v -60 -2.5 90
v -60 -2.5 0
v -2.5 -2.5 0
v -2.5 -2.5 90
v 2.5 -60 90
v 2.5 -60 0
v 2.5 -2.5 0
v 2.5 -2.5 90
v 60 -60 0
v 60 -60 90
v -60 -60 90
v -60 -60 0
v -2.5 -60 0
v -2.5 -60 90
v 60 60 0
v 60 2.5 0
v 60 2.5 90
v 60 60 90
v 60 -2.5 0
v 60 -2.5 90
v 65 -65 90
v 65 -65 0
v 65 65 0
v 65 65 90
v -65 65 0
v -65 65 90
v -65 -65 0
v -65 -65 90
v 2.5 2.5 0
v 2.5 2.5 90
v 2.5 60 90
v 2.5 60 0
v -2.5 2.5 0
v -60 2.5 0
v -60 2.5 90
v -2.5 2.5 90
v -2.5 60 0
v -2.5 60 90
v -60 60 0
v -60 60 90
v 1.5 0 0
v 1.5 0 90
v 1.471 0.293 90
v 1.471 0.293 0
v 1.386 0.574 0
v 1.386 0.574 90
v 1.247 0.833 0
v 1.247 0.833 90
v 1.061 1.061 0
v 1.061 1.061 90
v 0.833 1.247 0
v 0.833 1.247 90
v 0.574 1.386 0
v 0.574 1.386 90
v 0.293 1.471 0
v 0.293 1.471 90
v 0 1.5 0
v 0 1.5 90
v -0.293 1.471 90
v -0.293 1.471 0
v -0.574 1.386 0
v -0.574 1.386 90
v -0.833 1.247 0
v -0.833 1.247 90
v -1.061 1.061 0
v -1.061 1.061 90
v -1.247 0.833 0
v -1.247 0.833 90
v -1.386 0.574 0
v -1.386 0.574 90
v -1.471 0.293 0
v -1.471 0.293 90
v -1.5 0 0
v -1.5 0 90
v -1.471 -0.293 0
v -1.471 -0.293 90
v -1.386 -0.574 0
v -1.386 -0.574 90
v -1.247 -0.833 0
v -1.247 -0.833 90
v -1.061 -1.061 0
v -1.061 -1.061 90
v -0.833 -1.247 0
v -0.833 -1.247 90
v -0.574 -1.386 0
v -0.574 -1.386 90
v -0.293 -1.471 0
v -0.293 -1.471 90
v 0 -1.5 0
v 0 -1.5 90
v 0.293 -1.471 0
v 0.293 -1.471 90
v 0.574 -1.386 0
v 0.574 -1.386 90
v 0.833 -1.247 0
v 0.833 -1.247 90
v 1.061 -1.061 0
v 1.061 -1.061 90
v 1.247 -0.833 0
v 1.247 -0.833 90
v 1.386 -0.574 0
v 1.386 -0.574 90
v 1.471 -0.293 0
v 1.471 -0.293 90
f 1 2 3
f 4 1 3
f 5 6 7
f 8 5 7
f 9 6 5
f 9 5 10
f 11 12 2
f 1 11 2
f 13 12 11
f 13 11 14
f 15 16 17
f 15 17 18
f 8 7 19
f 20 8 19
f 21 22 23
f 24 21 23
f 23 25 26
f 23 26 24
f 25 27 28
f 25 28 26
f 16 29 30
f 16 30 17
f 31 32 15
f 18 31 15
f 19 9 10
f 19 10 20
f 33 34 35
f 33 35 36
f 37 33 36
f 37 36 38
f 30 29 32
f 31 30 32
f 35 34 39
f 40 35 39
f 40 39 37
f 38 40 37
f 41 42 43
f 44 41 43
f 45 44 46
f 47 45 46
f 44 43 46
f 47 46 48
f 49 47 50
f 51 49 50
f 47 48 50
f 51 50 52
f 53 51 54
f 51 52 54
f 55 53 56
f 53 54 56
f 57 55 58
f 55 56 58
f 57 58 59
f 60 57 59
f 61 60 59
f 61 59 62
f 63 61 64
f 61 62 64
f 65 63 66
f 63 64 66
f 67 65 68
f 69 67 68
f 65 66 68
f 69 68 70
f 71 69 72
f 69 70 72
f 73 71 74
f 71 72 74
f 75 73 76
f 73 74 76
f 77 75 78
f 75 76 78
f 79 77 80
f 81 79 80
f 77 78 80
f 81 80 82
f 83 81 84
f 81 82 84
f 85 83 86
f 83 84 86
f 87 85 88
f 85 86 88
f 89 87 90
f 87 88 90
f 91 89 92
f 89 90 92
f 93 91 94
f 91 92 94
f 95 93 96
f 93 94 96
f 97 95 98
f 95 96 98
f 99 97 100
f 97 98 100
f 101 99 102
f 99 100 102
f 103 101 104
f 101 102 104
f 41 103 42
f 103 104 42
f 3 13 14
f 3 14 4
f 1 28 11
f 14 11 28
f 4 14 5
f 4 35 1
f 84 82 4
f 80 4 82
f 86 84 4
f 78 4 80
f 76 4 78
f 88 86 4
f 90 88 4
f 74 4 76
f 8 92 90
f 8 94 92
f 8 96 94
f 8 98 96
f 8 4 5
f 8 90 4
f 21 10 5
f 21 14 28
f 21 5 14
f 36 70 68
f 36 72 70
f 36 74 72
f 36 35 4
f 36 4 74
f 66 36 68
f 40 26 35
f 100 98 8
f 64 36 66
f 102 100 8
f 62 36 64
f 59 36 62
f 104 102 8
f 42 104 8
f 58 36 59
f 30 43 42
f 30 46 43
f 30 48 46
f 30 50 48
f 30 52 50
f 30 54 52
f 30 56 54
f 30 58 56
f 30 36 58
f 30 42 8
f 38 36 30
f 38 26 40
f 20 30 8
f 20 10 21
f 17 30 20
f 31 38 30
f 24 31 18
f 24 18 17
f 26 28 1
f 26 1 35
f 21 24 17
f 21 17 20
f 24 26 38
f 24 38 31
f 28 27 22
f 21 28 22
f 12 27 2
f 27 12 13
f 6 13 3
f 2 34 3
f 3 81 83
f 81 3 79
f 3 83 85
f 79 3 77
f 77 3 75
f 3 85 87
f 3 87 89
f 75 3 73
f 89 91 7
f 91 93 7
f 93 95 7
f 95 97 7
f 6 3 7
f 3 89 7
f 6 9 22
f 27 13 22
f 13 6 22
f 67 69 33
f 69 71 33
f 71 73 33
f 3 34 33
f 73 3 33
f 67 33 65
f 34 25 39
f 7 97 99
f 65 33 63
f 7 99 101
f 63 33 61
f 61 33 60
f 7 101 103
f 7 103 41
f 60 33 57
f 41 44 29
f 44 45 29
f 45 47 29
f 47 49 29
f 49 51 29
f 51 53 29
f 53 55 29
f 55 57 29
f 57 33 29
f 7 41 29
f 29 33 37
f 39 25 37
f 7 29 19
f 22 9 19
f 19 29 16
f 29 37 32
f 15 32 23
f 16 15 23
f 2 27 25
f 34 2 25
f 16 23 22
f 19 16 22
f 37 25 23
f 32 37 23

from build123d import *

# Parameters (mm, degrees)
SKICA1_W                 = 130
SKICA1_H                 = 130
P_IDAT_VYSUNUT_M1_DEPTH  = 90
SKICA3_W                 = 57.5
SKICA3_H                 = 57.5
ODEBRAT_VYSUNUT_M1_DEPTH = 90
SKICA4_R                 = 1.5
ODEBRAT_VYSUNUT_M2_DEPTH = 90


with BuildPart() as part:
    # Skica1 → Přidat vysunutím1 (new body)
    with BuildSketch(Plane.XY):
        Rectangle(SKICA1_W, SKICA1_H)
    extrude(amount=P_IDAT_VYSUNUT_M1_DEPTH)

    # Skica3 → Odebrat vysunutím1 (cut)
    with BuildSketch(Plane.XY.offset(90)):
        with Locations((-31.25, 31.25)):
            Rectangle(SKICA3_W, SKICA3_H)
        with Locations((31.25, 31.25)):
            Rectangle(SKICA3_W, SKICA3_H)
        with Locations((-31.25, -31.25)):
            Rectangle(SKICA3_W, SKICA3_H)
        with Locations((31.25, -31.25)):
            Rectangle(SKICA3_W, SKICA3_H)
    extrude(amount=-ODEBRAT_VYSUNUT_M1_DEPTH, mode=Mode.SUBTRACT)

    # Skica4 → Odebrat vysunutím2 (cut)
    with BuildSketch(Plane.XY.offset(90)):
        Circle(SKICA4_R)
    extrude(amount=-ODEBRAT_VYSUNUT_M2_DEPTH, mode=Mode.SUBTRACT)


solid = part.part
